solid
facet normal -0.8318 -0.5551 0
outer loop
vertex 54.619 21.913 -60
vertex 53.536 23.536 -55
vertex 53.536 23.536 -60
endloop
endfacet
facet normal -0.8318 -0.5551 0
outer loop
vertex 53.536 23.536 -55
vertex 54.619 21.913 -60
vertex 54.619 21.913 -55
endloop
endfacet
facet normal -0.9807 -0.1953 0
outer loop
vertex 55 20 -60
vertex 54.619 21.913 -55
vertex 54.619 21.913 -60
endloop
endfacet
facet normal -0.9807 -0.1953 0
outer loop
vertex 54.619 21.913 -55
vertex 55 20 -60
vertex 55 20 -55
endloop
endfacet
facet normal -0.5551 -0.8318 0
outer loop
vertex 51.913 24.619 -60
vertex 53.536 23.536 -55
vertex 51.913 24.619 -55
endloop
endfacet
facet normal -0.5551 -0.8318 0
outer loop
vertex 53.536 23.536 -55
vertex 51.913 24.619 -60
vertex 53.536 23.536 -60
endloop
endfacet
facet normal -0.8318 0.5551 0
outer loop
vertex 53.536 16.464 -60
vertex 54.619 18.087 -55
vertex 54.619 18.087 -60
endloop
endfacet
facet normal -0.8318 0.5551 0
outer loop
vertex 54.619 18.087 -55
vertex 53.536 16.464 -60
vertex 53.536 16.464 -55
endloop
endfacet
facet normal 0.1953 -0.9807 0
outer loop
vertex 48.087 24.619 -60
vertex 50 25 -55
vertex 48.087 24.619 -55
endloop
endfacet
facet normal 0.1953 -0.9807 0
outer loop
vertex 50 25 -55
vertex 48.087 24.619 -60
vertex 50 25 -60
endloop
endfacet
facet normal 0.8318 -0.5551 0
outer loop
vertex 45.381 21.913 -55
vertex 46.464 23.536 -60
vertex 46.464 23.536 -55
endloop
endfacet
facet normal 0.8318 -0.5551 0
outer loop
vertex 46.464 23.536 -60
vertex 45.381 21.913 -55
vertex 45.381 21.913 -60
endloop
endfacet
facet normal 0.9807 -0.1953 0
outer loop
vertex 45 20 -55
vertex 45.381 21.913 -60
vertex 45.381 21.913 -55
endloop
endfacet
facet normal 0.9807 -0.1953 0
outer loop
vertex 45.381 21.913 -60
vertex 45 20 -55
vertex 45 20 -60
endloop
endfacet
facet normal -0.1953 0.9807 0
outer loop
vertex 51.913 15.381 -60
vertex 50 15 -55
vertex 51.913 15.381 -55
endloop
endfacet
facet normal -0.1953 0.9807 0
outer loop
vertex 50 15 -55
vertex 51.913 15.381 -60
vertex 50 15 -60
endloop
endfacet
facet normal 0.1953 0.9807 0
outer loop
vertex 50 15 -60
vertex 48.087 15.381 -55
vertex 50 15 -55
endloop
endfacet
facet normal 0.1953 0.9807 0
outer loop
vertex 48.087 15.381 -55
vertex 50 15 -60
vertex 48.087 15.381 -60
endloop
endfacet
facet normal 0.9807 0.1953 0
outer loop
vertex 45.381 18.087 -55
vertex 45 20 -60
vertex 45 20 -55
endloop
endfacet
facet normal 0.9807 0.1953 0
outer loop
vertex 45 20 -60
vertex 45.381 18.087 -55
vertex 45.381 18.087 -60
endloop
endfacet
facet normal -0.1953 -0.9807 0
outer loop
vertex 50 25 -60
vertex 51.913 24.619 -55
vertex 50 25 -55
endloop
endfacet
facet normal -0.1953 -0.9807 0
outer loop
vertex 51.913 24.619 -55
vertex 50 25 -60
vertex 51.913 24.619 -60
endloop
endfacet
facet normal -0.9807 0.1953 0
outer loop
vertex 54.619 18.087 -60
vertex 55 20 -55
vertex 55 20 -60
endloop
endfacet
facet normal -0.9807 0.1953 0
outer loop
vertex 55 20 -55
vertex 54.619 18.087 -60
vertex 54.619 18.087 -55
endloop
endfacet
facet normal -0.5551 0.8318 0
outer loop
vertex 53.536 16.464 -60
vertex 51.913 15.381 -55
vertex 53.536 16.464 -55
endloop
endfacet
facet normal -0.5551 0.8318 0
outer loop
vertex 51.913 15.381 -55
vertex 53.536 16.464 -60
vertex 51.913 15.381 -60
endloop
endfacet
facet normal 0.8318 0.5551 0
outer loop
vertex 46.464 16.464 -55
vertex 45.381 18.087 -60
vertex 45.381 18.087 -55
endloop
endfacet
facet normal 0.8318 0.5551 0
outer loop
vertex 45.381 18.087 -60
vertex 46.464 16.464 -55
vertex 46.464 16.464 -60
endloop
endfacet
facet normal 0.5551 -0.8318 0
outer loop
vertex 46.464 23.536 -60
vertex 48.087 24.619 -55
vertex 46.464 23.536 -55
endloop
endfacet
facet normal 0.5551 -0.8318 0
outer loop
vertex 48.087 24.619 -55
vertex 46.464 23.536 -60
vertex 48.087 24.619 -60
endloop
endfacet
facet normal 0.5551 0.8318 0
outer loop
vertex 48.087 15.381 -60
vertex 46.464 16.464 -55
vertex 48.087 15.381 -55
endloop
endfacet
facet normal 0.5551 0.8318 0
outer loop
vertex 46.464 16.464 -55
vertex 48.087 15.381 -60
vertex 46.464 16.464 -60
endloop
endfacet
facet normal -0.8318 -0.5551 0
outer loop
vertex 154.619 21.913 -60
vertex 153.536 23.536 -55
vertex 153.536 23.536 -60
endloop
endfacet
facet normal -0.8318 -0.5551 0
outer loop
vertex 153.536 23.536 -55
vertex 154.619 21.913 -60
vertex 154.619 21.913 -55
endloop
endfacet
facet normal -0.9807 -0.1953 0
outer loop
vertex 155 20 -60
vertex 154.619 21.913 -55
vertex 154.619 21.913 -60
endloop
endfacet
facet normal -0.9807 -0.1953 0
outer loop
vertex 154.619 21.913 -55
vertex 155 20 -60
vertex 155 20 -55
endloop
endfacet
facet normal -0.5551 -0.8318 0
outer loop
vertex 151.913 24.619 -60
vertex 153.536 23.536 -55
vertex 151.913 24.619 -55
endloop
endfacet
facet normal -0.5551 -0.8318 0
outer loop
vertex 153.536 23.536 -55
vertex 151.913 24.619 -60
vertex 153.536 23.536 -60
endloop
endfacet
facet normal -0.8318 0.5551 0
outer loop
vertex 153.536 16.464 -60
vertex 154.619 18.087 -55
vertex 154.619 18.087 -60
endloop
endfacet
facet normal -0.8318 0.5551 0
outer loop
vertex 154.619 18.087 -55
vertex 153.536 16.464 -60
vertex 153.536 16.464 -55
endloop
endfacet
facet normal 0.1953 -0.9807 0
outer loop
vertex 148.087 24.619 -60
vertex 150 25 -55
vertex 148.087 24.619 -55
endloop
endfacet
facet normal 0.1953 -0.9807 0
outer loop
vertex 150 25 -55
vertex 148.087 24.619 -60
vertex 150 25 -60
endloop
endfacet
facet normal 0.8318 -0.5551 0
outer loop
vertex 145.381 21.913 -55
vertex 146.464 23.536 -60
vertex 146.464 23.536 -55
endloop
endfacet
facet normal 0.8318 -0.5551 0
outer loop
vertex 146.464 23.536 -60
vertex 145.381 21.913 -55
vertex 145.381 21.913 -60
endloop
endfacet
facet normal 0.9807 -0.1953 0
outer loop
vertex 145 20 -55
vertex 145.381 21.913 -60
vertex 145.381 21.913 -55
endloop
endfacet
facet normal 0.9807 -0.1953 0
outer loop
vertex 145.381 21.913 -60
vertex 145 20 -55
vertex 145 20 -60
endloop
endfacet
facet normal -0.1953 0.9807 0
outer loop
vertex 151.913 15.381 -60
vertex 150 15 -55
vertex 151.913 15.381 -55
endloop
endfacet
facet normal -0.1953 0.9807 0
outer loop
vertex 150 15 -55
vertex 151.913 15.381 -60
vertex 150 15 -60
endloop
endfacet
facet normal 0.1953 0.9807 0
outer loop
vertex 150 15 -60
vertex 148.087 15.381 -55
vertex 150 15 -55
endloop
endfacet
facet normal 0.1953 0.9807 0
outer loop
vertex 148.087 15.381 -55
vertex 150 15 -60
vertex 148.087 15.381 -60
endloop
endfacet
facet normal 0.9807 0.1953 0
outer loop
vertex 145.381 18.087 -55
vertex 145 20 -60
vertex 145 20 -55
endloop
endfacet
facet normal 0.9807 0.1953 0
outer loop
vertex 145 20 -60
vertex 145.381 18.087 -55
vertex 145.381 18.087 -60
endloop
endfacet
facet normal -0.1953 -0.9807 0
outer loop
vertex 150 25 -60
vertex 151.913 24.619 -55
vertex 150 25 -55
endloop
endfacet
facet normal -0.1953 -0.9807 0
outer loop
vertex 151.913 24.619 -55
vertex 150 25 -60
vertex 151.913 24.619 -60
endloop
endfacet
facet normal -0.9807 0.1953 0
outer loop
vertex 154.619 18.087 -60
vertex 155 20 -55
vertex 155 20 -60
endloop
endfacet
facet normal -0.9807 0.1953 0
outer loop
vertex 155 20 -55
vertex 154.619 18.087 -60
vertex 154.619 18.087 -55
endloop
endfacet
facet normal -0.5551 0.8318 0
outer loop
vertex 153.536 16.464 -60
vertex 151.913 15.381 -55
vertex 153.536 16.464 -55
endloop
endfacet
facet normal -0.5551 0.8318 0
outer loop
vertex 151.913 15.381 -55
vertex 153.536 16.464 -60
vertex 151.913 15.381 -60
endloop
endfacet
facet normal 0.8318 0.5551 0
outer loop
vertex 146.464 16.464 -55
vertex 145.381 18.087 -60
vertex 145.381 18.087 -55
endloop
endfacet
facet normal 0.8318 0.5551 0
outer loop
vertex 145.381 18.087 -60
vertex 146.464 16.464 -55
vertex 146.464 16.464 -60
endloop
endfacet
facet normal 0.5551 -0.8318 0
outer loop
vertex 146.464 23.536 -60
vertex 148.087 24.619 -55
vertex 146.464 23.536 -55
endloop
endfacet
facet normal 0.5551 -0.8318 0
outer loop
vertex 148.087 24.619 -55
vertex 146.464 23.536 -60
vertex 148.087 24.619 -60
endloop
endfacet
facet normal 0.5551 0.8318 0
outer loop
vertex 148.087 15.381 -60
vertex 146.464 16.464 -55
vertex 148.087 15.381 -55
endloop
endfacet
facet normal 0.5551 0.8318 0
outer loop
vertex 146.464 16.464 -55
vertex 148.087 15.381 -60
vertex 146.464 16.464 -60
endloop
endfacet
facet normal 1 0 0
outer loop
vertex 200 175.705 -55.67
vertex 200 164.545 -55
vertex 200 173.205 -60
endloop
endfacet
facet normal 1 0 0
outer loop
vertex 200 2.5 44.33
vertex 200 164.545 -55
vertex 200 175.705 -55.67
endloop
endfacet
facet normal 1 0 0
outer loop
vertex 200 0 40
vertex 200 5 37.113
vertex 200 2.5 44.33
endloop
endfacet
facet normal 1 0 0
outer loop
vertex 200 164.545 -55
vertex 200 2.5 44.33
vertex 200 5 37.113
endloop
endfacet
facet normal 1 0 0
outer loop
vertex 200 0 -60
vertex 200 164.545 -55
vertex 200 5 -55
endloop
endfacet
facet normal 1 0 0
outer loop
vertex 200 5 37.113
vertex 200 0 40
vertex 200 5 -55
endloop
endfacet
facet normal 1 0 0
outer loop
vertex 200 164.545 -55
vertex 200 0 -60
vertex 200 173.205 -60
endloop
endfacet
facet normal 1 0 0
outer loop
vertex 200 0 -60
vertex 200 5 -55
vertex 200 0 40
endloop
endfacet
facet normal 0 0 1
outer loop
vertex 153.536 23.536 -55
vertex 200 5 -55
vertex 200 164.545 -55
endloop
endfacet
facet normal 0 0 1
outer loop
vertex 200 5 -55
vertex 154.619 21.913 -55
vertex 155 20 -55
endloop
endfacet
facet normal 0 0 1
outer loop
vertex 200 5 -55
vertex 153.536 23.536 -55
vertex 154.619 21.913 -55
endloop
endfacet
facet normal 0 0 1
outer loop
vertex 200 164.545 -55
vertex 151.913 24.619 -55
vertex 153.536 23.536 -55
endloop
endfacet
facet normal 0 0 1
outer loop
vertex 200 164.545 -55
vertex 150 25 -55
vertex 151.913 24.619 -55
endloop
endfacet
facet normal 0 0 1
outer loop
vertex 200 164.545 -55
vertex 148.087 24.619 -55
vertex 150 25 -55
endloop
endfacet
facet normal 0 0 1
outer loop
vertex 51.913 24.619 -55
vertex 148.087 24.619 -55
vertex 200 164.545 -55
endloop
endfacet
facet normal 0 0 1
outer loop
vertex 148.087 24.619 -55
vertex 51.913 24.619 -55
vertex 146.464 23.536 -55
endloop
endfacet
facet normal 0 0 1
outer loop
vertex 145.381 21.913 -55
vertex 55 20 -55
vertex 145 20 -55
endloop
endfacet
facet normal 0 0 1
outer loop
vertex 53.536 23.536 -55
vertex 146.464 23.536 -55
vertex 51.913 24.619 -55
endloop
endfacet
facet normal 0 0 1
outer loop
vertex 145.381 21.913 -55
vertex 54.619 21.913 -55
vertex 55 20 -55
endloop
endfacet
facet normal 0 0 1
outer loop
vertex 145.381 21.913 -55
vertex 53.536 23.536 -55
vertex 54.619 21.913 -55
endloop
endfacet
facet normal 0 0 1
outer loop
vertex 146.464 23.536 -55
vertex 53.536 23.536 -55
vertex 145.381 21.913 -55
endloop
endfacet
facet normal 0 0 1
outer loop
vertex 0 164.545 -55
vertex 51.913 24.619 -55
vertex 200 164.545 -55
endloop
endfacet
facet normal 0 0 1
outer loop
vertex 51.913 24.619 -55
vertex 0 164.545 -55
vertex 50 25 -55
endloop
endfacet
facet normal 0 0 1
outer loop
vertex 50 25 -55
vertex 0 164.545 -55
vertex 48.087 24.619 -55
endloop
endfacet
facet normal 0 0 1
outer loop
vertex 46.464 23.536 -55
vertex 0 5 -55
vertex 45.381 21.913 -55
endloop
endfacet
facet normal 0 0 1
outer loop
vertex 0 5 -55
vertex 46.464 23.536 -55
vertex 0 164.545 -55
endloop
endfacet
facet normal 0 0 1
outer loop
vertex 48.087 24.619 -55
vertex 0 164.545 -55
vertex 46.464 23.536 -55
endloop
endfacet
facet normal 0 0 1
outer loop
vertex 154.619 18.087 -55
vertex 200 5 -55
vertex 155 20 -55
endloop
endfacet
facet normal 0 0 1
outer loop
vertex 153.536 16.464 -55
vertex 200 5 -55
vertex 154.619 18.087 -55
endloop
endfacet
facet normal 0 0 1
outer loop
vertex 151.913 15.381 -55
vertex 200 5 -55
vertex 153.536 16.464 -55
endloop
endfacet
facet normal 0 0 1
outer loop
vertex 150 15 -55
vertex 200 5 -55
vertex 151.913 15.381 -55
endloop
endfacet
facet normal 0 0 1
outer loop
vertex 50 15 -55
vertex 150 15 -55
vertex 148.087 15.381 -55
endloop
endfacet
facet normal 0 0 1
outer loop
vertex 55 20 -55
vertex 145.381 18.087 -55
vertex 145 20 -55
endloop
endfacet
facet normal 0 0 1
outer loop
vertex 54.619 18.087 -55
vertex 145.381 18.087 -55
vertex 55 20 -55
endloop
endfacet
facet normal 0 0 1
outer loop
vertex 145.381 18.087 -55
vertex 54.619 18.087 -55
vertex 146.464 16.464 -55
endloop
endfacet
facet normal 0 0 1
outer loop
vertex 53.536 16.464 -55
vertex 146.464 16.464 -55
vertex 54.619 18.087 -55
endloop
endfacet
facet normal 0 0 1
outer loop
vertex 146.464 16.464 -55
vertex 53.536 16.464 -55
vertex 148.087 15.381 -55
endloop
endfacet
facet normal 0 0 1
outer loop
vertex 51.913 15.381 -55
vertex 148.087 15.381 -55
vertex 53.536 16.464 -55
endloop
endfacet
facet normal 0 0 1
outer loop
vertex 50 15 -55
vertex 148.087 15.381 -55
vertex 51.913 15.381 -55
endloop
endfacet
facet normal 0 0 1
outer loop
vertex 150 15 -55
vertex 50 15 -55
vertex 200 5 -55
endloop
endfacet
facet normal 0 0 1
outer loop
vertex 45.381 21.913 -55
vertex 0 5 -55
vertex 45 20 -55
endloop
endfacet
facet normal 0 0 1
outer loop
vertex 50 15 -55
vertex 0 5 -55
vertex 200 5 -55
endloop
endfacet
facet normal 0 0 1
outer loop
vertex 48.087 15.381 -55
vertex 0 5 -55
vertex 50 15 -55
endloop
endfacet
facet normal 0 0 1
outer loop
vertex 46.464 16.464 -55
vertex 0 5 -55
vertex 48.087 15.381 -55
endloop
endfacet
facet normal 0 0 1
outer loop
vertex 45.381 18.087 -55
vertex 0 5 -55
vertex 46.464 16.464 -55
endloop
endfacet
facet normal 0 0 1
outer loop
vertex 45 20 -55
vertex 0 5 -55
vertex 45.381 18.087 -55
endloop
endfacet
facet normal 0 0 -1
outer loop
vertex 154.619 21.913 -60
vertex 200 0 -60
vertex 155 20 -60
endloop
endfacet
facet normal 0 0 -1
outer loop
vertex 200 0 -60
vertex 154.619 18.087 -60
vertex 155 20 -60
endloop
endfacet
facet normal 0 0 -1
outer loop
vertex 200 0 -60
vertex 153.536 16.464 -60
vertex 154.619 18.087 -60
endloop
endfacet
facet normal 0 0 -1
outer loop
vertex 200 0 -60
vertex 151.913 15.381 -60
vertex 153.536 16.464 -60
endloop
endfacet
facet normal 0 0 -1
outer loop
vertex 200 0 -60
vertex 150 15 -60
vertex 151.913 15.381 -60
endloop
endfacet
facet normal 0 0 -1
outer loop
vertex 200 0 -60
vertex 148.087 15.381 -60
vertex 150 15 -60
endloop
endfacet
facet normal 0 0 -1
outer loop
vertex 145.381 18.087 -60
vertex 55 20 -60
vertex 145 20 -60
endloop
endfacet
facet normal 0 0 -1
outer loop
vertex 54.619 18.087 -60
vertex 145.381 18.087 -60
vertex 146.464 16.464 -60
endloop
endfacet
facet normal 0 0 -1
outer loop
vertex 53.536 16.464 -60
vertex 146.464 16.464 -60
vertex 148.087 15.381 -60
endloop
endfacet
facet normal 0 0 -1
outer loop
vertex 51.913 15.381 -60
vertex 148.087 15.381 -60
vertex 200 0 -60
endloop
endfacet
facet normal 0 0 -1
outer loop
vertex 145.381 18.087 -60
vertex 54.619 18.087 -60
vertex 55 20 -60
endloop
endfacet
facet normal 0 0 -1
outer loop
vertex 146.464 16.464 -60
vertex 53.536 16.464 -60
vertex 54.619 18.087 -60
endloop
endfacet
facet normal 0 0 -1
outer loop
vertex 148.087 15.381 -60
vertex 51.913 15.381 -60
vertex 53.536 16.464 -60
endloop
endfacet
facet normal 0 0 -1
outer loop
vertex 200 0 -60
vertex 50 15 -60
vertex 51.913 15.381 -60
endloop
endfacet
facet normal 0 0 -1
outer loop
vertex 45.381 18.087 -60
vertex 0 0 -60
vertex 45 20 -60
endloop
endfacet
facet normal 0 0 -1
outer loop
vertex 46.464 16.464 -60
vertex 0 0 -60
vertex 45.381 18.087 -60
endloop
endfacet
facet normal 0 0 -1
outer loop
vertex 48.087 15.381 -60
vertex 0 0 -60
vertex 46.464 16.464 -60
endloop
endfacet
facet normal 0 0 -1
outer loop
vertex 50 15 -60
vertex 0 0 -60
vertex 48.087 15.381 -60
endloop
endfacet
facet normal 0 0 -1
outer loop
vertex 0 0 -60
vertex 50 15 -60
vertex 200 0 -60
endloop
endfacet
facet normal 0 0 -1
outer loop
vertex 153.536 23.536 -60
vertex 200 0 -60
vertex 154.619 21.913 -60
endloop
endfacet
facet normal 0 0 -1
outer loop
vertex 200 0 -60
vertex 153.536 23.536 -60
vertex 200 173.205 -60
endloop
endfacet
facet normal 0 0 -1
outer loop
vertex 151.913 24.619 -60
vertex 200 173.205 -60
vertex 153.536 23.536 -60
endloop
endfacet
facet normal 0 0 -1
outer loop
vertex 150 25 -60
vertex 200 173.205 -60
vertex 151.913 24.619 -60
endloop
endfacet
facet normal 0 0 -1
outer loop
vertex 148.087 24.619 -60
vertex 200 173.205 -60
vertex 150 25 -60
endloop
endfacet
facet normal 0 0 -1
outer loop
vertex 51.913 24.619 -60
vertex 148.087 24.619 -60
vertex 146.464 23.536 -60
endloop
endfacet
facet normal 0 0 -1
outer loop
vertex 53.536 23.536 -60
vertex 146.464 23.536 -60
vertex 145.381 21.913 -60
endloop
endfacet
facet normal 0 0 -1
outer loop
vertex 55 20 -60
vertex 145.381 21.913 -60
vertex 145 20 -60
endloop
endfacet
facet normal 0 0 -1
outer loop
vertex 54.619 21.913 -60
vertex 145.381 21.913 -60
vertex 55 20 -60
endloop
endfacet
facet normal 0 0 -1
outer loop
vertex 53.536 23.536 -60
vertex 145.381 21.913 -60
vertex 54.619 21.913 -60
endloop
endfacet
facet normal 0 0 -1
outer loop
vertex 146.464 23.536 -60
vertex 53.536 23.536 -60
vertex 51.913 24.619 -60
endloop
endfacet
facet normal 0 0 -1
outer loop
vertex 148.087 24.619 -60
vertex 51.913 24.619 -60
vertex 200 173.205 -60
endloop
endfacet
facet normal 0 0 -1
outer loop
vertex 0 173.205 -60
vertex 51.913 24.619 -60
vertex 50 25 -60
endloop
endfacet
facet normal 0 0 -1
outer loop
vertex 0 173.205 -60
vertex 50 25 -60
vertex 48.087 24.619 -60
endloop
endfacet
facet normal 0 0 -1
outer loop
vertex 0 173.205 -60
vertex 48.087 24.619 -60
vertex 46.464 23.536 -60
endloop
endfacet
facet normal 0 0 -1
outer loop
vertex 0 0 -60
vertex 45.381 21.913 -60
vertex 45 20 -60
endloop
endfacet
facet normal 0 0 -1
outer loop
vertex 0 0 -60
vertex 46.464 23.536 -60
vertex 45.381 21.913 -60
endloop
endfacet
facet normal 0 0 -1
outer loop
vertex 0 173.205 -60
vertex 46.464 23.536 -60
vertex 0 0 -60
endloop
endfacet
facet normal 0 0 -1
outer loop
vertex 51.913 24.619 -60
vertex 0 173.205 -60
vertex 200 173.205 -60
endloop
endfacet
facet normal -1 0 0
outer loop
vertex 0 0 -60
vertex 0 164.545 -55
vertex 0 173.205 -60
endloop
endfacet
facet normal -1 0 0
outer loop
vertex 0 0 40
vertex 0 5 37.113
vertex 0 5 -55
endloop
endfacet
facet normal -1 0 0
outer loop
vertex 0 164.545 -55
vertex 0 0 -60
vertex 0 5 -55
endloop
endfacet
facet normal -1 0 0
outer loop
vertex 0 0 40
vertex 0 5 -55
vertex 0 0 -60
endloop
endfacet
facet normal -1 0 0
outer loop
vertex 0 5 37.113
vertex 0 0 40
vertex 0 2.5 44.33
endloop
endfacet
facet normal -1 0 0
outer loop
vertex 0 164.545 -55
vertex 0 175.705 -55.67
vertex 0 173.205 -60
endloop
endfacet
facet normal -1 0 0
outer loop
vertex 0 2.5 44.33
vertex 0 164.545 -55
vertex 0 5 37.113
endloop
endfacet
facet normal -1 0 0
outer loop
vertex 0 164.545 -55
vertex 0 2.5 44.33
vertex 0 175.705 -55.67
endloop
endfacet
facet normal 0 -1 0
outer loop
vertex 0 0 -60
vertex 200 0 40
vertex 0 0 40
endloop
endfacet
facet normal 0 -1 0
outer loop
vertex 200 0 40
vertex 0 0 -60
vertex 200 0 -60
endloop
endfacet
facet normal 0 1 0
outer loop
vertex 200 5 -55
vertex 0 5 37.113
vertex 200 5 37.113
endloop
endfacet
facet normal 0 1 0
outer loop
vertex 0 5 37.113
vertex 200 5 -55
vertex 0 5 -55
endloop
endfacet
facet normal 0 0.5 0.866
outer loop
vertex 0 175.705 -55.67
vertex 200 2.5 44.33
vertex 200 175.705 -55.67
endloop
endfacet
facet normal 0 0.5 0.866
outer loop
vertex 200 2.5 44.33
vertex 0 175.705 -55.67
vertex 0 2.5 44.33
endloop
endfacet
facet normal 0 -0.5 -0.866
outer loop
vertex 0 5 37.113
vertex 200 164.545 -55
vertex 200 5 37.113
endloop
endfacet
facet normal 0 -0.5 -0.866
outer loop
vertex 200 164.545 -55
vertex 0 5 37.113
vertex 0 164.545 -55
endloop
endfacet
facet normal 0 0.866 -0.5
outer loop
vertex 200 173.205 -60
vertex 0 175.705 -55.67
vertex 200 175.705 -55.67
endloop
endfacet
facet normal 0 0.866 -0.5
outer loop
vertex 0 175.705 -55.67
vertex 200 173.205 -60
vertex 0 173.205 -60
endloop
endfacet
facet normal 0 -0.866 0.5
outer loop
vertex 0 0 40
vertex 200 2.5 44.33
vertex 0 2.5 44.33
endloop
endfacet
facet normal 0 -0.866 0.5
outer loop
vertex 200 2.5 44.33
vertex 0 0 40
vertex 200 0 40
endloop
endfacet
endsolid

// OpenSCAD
angle=30;
max_height=40;
solar_panel_size=[200, 200];
thickness=5;
holes_count = 2;
hole_radius = 5;
holes_edge=50;

//this only defines half of the holder according to the printer size (Prusa mini)

module Holder(angle=30, max_height=40, solar_panel_size=[200, 200], thickness=5, holes_count = 2, hole_radius = 5, holes_edge=20) {
    
    height_down = max_height - solar_panel_size[0] * sin(angle);
    
    translate([0, 0, height_down]) {
        cube([solar_panel_size[0], thickness, solar_panel_size[0] * sin(angle)]);
    }
    difference() {
        translate([0, 0, height_down]) {
            cube([solar_panel_size[0], solar_panel_size[1] * cos(angle), thickness]);
        }
           
        holes_distance = (solar_panel_size[0] - 2*holes_edge) / (holes_count - 1);
        for (x = [0:holes_count - 1]) {
            translate([holes_edge + x * holes_distance, max_height / 2, height_down - 1]) {
                
                #cylinder(r = hole_radius, h = thickness + 2);
            }
        }
    }
    
    translate([0, 0, max_height]) {
        rotate([-angle, 0, 0]) { 
            cube([solar_panel_size[0], solar_panel_size[1], 5]);
        }
    }
}

Holder(angle=angle, max_height=max_height, solar_panel_size=solar_panel_size, thickness=thickness, holes_count=holes_count, hole_radius=hole_radius, holes_edge=holes_edge);
